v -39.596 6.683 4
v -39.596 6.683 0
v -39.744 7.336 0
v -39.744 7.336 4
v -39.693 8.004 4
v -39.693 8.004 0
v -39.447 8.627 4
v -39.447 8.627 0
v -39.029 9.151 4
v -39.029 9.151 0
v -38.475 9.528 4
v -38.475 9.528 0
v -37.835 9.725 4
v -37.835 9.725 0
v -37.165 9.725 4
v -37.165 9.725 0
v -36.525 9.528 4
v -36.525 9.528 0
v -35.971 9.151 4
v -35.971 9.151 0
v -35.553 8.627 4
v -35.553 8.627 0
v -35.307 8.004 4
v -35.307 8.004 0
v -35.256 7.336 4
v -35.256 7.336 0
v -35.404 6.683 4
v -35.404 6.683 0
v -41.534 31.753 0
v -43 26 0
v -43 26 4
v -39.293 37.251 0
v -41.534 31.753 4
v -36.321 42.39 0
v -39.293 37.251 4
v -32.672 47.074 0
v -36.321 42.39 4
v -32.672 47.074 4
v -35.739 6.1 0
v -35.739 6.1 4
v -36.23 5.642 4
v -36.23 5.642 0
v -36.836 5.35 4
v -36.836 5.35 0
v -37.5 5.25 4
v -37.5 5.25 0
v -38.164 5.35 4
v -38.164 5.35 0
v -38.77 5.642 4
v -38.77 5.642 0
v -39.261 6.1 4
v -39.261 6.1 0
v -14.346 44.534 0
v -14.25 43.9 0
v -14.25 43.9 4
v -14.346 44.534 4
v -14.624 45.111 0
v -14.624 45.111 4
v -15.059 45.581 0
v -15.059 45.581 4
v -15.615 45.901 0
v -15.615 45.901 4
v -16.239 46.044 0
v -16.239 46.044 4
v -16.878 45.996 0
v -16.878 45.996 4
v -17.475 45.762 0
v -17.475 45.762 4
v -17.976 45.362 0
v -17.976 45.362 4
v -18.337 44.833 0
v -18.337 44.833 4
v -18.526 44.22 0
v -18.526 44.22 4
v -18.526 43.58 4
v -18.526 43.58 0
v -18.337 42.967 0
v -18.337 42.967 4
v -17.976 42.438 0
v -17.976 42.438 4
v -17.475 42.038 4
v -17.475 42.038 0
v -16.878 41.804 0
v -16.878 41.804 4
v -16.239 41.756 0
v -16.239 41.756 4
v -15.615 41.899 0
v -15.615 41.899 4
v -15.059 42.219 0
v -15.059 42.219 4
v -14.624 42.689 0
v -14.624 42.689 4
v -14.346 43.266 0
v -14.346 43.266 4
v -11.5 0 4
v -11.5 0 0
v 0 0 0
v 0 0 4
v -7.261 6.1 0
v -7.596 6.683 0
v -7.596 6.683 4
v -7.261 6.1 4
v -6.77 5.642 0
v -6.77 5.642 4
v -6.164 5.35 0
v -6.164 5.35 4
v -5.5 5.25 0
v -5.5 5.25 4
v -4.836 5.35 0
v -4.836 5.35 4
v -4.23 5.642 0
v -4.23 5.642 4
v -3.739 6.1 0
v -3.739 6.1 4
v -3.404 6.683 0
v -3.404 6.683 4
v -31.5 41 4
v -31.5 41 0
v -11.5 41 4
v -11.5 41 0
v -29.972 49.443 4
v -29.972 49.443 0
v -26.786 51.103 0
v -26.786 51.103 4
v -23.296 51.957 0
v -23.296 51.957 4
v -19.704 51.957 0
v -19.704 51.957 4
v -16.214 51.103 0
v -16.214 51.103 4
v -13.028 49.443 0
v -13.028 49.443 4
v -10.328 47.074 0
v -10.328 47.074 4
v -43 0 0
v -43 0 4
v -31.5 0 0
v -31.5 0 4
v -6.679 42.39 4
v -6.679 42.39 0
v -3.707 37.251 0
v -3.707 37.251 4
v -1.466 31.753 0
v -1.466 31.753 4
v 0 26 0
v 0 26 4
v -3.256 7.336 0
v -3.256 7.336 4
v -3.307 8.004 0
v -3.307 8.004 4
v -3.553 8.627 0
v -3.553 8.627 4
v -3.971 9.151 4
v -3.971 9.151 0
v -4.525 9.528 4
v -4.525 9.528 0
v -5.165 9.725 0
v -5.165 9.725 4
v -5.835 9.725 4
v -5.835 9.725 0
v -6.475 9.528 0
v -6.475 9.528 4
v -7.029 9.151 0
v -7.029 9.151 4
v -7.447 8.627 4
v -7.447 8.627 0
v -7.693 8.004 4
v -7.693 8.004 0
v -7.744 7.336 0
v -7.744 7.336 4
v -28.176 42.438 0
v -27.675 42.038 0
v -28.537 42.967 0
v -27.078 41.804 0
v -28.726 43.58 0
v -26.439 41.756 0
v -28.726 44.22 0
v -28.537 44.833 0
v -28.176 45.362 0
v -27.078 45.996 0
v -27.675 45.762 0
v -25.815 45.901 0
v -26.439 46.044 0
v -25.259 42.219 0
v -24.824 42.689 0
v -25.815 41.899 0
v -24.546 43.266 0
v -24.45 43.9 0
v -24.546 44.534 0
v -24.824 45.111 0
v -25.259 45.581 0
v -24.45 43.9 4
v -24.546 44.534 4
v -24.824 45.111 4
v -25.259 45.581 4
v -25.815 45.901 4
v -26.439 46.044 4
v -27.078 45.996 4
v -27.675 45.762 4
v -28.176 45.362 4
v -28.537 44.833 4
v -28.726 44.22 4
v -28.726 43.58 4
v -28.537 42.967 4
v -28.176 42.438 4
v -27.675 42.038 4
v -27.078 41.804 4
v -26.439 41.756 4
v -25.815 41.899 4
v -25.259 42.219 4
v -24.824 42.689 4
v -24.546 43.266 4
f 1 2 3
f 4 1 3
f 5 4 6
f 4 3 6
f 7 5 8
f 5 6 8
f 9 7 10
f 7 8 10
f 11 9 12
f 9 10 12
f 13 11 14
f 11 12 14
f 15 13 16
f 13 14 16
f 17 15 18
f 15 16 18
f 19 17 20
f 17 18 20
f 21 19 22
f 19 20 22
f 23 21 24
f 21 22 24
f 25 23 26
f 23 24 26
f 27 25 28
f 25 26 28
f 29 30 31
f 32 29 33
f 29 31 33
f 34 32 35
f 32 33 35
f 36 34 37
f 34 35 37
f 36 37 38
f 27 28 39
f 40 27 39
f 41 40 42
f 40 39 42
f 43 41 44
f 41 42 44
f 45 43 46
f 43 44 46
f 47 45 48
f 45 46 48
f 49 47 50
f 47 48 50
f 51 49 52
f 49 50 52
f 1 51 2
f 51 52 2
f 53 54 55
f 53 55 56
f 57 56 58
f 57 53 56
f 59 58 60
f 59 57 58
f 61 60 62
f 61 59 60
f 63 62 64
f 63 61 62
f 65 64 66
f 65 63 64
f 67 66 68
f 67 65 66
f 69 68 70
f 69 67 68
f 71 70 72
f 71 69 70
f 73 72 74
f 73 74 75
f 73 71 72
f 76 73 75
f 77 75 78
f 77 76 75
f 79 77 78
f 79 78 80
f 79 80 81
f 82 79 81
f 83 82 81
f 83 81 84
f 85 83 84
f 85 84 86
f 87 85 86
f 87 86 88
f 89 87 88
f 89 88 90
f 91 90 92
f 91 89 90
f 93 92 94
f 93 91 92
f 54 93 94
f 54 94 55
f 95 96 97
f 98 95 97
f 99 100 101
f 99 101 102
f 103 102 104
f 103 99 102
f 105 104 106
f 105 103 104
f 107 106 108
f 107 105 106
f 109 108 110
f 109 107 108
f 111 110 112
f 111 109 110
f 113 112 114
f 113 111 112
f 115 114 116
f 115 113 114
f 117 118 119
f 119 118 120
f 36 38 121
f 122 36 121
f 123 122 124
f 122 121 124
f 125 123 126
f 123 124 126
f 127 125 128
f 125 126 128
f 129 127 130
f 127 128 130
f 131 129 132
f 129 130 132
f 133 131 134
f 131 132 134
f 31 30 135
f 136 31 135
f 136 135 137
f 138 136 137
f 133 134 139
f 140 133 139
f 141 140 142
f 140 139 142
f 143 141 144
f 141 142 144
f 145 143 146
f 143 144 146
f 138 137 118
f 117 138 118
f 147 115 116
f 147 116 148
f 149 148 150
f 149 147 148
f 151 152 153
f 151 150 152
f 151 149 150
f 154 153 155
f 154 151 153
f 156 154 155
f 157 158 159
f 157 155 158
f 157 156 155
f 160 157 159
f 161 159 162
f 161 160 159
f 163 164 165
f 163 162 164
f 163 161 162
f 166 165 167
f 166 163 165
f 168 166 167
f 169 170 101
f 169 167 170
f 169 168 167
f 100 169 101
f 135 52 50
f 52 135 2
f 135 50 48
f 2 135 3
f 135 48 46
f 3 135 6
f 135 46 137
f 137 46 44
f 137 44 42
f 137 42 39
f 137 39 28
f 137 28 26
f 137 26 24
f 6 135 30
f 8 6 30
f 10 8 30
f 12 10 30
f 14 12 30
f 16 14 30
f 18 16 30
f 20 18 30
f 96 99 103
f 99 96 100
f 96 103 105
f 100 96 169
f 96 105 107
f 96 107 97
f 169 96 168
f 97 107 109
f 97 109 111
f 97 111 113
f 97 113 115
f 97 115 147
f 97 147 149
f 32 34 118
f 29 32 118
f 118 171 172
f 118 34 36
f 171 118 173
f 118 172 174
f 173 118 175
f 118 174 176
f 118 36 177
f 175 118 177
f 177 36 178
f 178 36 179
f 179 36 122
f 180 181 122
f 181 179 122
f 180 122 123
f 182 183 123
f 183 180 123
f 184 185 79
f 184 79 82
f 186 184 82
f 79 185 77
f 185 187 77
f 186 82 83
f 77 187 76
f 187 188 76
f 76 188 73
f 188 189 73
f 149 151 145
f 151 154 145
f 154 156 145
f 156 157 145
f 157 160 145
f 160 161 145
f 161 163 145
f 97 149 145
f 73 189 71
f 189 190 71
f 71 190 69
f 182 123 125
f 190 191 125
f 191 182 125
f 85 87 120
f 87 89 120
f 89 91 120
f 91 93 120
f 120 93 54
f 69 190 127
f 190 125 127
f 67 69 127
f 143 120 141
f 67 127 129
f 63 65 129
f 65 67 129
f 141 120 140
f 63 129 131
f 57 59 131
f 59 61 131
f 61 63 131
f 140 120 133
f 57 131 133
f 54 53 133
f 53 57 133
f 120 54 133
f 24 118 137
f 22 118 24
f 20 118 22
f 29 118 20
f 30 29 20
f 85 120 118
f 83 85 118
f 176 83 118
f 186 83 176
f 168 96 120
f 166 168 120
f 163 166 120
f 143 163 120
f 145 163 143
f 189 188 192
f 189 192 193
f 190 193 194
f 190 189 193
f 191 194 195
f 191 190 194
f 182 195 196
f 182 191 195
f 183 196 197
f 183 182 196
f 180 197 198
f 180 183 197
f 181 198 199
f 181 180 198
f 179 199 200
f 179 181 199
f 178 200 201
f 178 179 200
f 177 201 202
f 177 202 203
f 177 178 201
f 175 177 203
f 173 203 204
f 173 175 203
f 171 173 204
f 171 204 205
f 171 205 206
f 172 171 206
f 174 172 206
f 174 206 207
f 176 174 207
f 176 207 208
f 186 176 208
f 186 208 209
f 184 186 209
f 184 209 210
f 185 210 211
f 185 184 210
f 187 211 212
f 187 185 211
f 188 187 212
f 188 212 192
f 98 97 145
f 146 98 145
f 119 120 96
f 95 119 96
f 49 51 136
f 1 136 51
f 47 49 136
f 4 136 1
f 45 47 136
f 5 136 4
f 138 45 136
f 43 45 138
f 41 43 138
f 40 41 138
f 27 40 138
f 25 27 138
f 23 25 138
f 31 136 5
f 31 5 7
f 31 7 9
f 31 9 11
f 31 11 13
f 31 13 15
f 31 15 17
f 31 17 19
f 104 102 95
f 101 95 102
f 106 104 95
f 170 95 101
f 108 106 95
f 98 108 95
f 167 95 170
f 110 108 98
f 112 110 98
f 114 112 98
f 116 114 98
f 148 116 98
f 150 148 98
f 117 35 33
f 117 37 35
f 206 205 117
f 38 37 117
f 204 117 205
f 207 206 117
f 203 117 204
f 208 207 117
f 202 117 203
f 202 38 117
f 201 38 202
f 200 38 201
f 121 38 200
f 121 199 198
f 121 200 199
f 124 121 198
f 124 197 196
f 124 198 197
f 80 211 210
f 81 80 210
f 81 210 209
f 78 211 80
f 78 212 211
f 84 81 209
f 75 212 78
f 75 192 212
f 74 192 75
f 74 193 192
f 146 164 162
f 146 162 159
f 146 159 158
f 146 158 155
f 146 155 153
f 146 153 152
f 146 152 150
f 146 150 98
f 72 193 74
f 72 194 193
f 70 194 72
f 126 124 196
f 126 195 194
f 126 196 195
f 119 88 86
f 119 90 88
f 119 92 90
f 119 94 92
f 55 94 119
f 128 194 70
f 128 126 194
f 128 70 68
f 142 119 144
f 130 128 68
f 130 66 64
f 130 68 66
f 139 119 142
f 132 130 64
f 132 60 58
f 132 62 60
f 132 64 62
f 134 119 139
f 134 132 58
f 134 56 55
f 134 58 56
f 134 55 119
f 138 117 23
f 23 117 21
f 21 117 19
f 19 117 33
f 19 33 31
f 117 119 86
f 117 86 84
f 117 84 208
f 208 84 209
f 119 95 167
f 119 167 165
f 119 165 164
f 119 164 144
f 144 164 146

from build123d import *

# Parameters (mm, degrees)
ESQUISSE1_R             = 2.15
BOSS_EXTRU_1_DEPTH      = 4
ENL_V_MAT_EXTRU_1_DEPTH = 71.717748833
ENL_V_MAT_EXTRU_2_DEPTH = 68.644180707


with BuildPart() as part:
    # Esquisse1 → Boss.-Extru.1 (new body)
    with BuildSketch(Plane.XY):
        Polygon((0, 0), (0, 41), (-15, 56), (-28, 56), (-43, 41), (-43, 0), (-31.5, 0), (-31.5, 41), (-11.5, 41), (-11.5, 0), align=None)
        with Locations((-16.4, 43.9)):
            Circle(ESQUISSE1_R, mode=Mode.SUBTRACT)
        with Locations((-26.6, 43.9)):
            Circle(ESQUISSE1_R, mode=Mode.SUBTRACT)
    extrude(amount=BOSS_EXTRU_1_DEPTH)

    # Esquisse2 → Enlèv. mat.-Extru.1 (cut, through all)
    with BuildSketch(Plane.XY.offset(4)):
        with BuildLine():
            Line((0, 26), (0, 41))
            Line((0, 41), (-15, 56))
            Line((-15, 56), (-28, 56))
            Line((-28, 56), (-43, 41))
            Line((-43, 41), (-43, 26))
            ThreePointArc((-43, 26), (-39.293390462, 37.251091059), (-32.672201457, 47.073812699))
            ThreePointArc((-32.672201457, 47.073812699), (-21.5, 52.064721102), (-10.327798543, 47.073812699))
            ThreePointArc((-10.327798543, 47.073812699), (-3.706609538, 37.251091059), (0, 26))
        make_face()
    extrude(amount=-ENL_V_MAT_EXTRU_1_DEPTH, mode=Mode.SUBTRACT)

    # Esquisse3 → Enlèv. mat.-Extru.2 (cut, through all)
    with BuildSketch(Plane(origin=(0, 0, 0), x_dir=(-1, 0, 0), z_dir=(0, 0, -1))):
        with BuildLine():
            ThreePointArc((35.403723193, 6.682611752), (37.5, 5.25), (39.596276807, 6.682611752))
            ThreePointArc((39.596276807, 6.682611752), (37.5, 9.75), (35.403723193, 6.682611752))
        make_face()
        with BuildLine():
            ThreePointArc((7.596276807, 6.682611752), (5.5, 5.25), (3.403723193, 6.682611752))
            ThreePointArc((3.403723193, 6.682611752), (5.5, 9.75), (7.596276807, 6.682611752))
        make_face()
    extrude(amount=-ENL_V_MAT_EXTRU_2_DEPTH, mode=Mode.SUBTRACT)


solid = part.part
